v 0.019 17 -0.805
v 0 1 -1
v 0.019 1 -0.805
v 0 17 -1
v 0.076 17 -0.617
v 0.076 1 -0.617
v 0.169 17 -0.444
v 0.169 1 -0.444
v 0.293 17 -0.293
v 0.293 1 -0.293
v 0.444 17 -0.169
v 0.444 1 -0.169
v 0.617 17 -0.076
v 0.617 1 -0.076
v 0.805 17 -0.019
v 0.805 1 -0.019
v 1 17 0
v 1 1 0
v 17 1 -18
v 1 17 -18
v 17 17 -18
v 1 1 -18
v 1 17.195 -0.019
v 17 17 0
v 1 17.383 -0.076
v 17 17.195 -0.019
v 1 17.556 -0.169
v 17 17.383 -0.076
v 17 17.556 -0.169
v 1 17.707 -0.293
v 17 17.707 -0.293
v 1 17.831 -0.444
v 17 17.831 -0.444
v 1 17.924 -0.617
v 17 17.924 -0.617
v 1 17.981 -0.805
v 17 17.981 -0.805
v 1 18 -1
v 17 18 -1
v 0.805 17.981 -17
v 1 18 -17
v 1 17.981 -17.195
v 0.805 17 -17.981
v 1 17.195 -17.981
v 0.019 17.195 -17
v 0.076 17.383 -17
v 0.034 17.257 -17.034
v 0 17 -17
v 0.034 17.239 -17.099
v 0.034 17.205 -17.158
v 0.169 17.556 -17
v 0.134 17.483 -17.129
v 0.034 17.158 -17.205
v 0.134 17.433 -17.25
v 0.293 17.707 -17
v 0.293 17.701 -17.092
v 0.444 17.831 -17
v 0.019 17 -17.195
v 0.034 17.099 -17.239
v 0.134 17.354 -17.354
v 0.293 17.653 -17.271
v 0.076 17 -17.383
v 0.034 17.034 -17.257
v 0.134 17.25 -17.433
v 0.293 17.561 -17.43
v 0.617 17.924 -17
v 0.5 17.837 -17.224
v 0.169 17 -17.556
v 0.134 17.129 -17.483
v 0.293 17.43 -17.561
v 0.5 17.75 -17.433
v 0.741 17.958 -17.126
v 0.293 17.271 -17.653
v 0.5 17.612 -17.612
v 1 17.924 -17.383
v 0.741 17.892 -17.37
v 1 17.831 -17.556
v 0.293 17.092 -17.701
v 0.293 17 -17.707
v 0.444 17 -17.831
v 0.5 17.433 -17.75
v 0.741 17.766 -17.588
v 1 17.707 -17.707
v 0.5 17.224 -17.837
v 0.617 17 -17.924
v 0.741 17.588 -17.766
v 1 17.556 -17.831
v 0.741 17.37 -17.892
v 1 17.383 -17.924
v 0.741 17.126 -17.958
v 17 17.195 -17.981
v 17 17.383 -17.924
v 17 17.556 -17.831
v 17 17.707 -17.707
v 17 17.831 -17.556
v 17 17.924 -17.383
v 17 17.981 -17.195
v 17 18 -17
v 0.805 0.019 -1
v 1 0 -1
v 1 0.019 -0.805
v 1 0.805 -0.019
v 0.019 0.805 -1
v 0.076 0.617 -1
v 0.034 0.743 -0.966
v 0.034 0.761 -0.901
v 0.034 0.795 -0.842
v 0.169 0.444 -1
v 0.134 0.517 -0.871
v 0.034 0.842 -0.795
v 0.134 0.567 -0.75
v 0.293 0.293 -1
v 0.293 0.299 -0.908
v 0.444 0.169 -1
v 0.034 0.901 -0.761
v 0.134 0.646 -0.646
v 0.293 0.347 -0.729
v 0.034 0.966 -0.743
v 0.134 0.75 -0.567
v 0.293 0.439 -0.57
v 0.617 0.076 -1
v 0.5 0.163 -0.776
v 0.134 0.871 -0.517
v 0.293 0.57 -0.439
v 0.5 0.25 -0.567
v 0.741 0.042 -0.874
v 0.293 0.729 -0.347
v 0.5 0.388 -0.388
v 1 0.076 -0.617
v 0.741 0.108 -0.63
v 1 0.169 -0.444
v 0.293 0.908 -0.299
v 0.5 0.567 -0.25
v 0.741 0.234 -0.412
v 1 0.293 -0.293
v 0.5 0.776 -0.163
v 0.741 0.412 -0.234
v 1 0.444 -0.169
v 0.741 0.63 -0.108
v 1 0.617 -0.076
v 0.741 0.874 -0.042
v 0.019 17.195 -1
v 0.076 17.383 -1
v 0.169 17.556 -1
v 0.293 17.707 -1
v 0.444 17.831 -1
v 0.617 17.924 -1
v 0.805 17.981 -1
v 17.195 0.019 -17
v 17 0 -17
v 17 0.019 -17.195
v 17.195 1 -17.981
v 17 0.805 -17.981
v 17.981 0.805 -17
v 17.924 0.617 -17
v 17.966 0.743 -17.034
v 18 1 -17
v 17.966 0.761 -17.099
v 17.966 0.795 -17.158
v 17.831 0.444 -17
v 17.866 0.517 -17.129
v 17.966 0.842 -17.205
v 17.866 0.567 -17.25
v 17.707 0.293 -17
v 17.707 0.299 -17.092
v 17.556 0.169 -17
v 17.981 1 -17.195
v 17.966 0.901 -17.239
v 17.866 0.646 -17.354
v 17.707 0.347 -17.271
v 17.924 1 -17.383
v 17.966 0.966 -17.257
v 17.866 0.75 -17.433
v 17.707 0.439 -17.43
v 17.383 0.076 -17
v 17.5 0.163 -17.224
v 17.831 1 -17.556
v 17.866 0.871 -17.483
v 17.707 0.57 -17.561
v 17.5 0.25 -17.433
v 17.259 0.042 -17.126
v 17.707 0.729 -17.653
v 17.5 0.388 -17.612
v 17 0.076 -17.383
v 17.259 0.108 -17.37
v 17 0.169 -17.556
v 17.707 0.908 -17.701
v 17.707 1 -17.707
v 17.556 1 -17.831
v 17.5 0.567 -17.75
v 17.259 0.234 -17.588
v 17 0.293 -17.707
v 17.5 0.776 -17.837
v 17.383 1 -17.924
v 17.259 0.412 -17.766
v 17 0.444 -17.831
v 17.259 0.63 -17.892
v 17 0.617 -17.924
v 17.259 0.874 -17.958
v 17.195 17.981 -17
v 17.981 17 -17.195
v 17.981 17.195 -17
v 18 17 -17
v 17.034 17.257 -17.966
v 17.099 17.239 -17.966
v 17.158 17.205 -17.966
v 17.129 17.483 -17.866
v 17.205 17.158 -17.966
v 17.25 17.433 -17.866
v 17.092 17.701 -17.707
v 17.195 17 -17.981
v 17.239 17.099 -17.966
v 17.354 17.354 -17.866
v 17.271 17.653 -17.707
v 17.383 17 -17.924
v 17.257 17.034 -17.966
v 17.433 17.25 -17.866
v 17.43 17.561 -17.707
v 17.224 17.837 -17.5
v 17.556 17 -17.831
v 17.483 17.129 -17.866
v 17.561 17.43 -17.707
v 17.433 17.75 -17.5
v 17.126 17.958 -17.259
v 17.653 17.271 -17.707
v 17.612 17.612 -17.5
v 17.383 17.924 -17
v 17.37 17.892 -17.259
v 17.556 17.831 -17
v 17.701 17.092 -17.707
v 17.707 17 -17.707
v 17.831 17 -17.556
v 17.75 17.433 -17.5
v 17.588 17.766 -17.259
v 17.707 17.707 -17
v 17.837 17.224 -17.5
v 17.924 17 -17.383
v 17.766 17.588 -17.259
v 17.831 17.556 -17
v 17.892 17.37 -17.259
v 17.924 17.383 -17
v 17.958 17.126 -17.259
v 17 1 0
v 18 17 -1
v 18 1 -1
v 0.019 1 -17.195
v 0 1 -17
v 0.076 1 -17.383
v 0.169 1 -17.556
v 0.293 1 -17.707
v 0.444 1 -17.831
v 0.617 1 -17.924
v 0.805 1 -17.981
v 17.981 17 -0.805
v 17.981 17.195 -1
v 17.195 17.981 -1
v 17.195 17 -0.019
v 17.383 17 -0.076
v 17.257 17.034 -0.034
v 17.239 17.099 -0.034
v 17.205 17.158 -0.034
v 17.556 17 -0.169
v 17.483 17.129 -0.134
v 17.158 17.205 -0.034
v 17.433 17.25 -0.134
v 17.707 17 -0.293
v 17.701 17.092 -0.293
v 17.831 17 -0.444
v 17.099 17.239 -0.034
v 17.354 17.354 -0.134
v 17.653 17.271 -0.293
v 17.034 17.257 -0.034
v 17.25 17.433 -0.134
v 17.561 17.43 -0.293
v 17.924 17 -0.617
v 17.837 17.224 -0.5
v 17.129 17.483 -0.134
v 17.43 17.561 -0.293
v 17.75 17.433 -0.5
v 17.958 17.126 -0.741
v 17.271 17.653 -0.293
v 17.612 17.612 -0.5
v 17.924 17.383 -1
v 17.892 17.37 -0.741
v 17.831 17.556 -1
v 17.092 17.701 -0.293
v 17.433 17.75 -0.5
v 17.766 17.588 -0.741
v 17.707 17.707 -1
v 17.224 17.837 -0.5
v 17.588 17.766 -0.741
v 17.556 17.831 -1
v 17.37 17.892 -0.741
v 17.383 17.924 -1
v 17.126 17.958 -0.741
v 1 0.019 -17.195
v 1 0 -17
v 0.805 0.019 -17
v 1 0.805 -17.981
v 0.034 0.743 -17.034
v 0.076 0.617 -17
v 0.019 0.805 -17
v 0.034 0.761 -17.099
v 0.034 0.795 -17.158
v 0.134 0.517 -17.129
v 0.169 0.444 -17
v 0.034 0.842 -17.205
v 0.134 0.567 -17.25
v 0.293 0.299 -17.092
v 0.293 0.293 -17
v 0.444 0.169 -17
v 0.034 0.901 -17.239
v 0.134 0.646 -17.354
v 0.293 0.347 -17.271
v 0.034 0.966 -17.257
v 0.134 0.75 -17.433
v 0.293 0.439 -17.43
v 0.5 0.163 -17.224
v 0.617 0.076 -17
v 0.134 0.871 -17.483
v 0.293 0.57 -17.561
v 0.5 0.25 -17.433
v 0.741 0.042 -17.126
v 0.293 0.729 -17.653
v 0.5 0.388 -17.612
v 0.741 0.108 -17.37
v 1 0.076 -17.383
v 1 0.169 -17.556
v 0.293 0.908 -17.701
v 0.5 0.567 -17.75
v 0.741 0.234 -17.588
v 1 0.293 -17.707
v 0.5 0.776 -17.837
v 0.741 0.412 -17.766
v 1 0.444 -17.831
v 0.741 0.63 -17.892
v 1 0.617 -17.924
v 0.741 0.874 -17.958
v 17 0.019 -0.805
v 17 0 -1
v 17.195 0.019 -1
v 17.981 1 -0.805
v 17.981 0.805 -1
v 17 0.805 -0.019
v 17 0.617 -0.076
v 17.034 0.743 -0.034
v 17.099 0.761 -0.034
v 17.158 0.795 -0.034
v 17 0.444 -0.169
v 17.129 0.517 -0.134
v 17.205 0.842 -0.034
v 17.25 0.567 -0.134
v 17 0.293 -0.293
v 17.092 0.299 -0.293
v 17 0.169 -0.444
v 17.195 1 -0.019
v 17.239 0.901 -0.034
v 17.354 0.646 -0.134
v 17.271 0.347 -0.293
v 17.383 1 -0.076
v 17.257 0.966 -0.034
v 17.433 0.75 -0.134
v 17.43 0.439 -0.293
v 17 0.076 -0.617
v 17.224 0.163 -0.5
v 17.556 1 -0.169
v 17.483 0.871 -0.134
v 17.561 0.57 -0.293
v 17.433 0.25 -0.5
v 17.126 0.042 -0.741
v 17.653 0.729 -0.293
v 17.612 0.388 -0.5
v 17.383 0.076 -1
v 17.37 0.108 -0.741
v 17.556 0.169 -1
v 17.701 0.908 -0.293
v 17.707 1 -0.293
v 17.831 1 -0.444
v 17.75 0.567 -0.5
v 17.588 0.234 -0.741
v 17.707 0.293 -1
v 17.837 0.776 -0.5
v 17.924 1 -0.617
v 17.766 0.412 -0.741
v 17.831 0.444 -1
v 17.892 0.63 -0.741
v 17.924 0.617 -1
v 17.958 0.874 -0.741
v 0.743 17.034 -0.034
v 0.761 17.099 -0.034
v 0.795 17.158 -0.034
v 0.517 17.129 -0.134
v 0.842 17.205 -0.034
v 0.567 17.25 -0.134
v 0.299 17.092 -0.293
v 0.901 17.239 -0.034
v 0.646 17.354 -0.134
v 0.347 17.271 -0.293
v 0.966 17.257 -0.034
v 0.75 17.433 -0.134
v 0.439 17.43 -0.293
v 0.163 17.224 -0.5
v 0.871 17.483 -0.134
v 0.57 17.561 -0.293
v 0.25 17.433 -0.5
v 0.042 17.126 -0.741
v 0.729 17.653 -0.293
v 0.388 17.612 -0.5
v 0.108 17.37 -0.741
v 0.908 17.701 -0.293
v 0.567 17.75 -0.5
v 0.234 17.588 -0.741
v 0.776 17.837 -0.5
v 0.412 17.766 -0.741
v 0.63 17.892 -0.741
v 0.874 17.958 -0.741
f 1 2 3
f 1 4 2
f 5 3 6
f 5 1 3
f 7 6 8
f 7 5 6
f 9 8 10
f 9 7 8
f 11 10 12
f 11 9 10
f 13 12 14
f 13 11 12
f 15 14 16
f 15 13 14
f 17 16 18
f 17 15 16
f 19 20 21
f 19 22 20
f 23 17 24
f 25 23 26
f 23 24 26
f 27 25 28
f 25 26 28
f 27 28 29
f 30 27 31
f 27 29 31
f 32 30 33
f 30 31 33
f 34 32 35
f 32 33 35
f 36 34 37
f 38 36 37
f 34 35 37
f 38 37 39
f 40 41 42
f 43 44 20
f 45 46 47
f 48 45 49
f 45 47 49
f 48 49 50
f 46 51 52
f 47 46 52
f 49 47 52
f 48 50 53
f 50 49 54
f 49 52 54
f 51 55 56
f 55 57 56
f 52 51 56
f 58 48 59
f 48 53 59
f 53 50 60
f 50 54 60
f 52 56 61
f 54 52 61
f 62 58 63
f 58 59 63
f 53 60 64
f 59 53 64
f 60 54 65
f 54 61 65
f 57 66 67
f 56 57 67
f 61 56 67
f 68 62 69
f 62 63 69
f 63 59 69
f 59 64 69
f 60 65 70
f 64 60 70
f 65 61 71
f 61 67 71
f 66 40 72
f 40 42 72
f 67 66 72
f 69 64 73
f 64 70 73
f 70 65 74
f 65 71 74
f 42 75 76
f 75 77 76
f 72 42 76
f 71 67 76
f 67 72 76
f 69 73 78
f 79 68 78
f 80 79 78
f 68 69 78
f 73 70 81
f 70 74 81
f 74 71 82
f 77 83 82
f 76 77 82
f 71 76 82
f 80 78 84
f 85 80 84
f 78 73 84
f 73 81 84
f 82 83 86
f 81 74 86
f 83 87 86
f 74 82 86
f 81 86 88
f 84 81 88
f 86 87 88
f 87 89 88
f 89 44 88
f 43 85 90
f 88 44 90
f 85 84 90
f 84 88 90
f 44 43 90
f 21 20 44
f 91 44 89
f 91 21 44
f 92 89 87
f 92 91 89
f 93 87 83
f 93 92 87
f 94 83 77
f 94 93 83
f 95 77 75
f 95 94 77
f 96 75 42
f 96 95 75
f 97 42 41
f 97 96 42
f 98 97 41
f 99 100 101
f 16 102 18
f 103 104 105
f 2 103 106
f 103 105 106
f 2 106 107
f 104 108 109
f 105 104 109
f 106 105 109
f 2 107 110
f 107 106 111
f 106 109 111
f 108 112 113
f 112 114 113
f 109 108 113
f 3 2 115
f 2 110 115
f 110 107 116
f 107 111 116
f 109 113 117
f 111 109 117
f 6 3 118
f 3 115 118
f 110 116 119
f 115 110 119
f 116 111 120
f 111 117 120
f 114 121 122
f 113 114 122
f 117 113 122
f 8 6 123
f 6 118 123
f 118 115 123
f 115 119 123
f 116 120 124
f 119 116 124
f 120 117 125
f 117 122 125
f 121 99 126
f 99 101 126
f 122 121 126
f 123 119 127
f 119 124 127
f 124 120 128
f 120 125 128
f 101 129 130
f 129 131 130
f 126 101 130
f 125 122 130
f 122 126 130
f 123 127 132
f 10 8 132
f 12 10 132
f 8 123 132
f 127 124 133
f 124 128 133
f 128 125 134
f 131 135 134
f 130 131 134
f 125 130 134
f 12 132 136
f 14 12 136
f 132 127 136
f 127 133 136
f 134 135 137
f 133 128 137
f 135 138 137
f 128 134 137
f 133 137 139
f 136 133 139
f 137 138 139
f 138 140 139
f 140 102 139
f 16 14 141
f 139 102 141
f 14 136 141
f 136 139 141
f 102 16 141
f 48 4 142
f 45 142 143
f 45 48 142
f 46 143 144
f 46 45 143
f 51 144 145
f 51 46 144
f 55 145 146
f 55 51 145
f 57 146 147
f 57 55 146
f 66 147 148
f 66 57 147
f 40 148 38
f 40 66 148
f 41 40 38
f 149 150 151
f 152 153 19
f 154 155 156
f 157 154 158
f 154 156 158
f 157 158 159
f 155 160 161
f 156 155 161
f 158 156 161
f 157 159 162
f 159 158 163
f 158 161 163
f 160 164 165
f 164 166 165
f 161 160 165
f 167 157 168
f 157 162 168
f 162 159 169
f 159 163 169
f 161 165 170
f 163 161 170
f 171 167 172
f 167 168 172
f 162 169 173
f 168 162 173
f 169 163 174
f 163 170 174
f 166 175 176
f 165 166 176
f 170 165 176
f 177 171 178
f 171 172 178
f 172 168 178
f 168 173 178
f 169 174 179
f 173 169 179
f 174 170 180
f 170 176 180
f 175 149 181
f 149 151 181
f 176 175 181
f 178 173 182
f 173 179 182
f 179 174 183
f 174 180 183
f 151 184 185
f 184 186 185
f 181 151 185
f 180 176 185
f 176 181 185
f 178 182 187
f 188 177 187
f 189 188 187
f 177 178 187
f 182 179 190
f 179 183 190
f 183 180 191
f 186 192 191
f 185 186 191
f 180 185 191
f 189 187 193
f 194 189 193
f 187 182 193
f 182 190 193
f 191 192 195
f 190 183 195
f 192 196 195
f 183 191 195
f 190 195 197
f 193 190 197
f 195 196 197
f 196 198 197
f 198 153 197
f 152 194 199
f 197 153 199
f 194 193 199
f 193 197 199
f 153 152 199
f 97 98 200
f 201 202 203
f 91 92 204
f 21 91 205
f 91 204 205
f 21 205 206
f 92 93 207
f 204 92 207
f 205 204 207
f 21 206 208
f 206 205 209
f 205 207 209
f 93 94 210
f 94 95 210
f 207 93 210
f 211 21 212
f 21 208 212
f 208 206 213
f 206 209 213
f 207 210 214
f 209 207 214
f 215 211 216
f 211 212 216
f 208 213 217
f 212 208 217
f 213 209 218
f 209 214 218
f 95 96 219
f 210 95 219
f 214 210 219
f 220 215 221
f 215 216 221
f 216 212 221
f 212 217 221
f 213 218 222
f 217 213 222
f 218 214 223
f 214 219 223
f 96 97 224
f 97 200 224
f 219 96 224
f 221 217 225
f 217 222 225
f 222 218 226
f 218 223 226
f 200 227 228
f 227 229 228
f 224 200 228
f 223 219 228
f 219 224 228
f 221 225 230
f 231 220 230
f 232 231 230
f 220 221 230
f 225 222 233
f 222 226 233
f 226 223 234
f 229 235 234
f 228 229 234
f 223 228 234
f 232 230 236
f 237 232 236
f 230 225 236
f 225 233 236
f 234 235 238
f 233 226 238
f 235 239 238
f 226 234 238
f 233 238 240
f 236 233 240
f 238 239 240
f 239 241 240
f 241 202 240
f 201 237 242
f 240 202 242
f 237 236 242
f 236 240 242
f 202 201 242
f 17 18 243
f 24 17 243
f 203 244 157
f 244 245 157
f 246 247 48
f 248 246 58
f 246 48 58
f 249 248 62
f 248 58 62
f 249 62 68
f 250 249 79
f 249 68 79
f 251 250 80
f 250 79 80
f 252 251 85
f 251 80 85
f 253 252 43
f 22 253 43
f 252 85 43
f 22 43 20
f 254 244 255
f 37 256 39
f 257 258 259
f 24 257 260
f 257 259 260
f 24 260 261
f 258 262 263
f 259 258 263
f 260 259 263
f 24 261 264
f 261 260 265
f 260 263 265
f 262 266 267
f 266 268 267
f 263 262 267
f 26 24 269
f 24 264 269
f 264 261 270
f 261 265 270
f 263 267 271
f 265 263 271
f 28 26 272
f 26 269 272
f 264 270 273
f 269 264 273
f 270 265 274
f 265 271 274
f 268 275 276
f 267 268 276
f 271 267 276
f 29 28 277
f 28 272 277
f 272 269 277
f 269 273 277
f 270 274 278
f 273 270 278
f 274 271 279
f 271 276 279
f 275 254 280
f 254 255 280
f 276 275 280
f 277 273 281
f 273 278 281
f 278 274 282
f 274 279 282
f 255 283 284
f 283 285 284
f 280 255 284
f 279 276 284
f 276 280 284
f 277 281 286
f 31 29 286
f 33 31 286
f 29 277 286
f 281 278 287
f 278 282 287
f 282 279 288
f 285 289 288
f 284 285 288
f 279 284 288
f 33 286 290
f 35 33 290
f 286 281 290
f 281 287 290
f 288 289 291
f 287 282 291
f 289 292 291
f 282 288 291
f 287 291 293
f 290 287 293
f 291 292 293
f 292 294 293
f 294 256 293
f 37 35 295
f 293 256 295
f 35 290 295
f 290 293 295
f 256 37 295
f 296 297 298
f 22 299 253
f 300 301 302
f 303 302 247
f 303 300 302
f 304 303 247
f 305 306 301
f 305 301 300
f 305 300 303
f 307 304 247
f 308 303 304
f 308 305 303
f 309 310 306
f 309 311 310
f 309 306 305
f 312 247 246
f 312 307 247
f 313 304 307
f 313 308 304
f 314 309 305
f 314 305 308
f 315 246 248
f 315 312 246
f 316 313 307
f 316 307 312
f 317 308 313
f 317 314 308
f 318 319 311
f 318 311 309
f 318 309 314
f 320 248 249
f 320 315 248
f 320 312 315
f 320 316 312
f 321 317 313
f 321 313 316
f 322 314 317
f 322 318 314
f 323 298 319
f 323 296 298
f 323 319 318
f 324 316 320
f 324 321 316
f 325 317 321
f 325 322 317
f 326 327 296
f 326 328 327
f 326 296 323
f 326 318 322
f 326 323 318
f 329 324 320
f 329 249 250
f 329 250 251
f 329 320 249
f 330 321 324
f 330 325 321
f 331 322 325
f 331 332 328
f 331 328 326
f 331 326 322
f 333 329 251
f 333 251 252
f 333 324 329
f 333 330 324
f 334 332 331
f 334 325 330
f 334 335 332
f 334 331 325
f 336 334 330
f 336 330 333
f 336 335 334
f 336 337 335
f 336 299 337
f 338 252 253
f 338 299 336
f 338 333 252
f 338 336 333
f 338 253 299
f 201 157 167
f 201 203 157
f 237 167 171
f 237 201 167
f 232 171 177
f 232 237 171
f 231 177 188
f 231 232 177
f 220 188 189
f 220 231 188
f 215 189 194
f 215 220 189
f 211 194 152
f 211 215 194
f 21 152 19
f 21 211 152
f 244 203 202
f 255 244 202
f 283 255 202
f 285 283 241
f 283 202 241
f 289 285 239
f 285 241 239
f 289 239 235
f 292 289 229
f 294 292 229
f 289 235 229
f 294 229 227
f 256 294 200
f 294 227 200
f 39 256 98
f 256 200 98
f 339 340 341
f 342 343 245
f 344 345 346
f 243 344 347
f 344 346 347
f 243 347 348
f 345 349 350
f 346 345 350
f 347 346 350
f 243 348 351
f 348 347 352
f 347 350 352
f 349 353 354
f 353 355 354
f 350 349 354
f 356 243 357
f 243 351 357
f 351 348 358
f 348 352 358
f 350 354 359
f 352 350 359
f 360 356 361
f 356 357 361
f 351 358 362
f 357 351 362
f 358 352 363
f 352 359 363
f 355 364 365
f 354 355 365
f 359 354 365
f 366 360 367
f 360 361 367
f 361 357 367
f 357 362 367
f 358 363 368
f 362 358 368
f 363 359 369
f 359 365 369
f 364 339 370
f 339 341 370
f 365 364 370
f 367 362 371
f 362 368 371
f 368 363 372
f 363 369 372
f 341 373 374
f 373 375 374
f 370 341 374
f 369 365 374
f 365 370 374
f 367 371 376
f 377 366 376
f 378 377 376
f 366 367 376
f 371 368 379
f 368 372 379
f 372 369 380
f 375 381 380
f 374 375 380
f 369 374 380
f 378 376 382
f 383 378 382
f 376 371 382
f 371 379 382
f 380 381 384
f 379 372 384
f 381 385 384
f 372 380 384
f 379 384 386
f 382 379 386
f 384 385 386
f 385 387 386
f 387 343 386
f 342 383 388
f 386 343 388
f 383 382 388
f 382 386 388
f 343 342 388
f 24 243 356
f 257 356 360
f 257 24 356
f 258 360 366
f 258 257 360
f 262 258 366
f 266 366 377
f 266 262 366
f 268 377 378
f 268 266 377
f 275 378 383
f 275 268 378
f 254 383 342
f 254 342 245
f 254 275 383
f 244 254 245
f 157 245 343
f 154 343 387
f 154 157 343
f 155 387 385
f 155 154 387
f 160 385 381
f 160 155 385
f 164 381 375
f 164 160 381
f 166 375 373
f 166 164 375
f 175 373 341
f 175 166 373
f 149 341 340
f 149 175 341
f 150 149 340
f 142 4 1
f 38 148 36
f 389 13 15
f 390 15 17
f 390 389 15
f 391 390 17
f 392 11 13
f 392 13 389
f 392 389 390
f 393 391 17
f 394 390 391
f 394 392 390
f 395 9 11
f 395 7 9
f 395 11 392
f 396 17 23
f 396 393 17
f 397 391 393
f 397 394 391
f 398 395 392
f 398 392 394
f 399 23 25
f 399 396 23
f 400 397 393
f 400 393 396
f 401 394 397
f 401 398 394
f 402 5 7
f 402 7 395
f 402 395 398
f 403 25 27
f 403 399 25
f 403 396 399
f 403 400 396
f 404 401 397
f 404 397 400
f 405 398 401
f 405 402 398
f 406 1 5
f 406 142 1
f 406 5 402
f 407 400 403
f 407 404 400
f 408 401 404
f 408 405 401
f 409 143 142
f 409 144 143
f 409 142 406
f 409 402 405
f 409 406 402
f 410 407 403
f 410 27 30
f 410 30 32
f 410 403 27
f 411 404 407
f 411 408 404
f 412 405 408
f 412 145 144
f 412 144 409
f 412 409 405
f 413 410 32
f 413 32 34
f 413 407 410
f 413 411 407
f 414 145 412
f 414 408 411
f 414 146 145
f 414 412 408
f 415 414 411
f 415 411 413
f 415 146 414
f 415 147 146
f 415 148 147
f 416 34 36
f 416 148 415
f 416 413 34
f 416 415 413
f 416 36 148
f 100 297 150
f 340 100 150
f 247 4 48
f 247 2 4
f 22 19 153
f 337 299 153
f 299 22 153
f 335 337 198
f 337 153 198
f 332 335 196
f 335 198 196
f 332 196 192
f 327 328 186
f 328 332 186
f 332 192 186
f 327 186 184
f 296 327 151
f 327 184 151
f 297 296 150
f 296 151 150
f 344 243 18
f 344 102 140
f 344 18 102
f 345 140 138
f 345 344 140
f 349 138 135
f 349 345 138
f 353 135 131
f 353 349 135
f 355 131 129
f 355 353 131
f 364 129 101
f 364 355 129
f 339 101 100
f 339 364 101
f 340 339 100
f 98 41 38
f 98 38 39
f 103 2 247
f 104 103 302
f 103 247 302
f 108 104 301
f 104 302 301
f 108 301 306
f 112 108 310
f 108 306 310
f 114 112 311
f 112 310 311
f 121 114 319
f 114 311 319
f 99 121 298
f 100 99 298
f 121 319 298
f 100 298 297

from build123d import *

# Parameters (mm, degrees)
SKETCH_1_W      = 18
SKETCH_1_H      = 18
EXTRUDE_1_DEPTH = 18
FILLET_1_R      = 1


with BuildPart() as part:
    # 草图1 → 凸台-拉伸1 (new body)
    with BuildSketch(Plane(origin=(0, 0, 0), x_dir=(1, 0, 0), z_dir=(0, 1, 0))):
        with Locations((9, 9)):
            Rectangle(SKETCH_1_W, SKETCH_1_H)
    extrude(amount=EXTRUDE_1_DEPTH)

    # 圆角1
    fillet_1_edges = [part.edges().sort_by_distance(p)[0] for p in [
        (18, 18, -9),
        (9, 18, -18),
        (0, 18, -9),
        (9, 0, -18),
        (18, 0, -9),
        (9, 0, 0),
        (0, 0, -9),
        (0, 9, -18),
        (18, 9, -18),
        (18, 9, 0),
        (0, 9, 0),
        (9, 18, 0),
    ]]
    fillet(fillet_1_edges, radius=FILLET_1_R)


solid = part.part
